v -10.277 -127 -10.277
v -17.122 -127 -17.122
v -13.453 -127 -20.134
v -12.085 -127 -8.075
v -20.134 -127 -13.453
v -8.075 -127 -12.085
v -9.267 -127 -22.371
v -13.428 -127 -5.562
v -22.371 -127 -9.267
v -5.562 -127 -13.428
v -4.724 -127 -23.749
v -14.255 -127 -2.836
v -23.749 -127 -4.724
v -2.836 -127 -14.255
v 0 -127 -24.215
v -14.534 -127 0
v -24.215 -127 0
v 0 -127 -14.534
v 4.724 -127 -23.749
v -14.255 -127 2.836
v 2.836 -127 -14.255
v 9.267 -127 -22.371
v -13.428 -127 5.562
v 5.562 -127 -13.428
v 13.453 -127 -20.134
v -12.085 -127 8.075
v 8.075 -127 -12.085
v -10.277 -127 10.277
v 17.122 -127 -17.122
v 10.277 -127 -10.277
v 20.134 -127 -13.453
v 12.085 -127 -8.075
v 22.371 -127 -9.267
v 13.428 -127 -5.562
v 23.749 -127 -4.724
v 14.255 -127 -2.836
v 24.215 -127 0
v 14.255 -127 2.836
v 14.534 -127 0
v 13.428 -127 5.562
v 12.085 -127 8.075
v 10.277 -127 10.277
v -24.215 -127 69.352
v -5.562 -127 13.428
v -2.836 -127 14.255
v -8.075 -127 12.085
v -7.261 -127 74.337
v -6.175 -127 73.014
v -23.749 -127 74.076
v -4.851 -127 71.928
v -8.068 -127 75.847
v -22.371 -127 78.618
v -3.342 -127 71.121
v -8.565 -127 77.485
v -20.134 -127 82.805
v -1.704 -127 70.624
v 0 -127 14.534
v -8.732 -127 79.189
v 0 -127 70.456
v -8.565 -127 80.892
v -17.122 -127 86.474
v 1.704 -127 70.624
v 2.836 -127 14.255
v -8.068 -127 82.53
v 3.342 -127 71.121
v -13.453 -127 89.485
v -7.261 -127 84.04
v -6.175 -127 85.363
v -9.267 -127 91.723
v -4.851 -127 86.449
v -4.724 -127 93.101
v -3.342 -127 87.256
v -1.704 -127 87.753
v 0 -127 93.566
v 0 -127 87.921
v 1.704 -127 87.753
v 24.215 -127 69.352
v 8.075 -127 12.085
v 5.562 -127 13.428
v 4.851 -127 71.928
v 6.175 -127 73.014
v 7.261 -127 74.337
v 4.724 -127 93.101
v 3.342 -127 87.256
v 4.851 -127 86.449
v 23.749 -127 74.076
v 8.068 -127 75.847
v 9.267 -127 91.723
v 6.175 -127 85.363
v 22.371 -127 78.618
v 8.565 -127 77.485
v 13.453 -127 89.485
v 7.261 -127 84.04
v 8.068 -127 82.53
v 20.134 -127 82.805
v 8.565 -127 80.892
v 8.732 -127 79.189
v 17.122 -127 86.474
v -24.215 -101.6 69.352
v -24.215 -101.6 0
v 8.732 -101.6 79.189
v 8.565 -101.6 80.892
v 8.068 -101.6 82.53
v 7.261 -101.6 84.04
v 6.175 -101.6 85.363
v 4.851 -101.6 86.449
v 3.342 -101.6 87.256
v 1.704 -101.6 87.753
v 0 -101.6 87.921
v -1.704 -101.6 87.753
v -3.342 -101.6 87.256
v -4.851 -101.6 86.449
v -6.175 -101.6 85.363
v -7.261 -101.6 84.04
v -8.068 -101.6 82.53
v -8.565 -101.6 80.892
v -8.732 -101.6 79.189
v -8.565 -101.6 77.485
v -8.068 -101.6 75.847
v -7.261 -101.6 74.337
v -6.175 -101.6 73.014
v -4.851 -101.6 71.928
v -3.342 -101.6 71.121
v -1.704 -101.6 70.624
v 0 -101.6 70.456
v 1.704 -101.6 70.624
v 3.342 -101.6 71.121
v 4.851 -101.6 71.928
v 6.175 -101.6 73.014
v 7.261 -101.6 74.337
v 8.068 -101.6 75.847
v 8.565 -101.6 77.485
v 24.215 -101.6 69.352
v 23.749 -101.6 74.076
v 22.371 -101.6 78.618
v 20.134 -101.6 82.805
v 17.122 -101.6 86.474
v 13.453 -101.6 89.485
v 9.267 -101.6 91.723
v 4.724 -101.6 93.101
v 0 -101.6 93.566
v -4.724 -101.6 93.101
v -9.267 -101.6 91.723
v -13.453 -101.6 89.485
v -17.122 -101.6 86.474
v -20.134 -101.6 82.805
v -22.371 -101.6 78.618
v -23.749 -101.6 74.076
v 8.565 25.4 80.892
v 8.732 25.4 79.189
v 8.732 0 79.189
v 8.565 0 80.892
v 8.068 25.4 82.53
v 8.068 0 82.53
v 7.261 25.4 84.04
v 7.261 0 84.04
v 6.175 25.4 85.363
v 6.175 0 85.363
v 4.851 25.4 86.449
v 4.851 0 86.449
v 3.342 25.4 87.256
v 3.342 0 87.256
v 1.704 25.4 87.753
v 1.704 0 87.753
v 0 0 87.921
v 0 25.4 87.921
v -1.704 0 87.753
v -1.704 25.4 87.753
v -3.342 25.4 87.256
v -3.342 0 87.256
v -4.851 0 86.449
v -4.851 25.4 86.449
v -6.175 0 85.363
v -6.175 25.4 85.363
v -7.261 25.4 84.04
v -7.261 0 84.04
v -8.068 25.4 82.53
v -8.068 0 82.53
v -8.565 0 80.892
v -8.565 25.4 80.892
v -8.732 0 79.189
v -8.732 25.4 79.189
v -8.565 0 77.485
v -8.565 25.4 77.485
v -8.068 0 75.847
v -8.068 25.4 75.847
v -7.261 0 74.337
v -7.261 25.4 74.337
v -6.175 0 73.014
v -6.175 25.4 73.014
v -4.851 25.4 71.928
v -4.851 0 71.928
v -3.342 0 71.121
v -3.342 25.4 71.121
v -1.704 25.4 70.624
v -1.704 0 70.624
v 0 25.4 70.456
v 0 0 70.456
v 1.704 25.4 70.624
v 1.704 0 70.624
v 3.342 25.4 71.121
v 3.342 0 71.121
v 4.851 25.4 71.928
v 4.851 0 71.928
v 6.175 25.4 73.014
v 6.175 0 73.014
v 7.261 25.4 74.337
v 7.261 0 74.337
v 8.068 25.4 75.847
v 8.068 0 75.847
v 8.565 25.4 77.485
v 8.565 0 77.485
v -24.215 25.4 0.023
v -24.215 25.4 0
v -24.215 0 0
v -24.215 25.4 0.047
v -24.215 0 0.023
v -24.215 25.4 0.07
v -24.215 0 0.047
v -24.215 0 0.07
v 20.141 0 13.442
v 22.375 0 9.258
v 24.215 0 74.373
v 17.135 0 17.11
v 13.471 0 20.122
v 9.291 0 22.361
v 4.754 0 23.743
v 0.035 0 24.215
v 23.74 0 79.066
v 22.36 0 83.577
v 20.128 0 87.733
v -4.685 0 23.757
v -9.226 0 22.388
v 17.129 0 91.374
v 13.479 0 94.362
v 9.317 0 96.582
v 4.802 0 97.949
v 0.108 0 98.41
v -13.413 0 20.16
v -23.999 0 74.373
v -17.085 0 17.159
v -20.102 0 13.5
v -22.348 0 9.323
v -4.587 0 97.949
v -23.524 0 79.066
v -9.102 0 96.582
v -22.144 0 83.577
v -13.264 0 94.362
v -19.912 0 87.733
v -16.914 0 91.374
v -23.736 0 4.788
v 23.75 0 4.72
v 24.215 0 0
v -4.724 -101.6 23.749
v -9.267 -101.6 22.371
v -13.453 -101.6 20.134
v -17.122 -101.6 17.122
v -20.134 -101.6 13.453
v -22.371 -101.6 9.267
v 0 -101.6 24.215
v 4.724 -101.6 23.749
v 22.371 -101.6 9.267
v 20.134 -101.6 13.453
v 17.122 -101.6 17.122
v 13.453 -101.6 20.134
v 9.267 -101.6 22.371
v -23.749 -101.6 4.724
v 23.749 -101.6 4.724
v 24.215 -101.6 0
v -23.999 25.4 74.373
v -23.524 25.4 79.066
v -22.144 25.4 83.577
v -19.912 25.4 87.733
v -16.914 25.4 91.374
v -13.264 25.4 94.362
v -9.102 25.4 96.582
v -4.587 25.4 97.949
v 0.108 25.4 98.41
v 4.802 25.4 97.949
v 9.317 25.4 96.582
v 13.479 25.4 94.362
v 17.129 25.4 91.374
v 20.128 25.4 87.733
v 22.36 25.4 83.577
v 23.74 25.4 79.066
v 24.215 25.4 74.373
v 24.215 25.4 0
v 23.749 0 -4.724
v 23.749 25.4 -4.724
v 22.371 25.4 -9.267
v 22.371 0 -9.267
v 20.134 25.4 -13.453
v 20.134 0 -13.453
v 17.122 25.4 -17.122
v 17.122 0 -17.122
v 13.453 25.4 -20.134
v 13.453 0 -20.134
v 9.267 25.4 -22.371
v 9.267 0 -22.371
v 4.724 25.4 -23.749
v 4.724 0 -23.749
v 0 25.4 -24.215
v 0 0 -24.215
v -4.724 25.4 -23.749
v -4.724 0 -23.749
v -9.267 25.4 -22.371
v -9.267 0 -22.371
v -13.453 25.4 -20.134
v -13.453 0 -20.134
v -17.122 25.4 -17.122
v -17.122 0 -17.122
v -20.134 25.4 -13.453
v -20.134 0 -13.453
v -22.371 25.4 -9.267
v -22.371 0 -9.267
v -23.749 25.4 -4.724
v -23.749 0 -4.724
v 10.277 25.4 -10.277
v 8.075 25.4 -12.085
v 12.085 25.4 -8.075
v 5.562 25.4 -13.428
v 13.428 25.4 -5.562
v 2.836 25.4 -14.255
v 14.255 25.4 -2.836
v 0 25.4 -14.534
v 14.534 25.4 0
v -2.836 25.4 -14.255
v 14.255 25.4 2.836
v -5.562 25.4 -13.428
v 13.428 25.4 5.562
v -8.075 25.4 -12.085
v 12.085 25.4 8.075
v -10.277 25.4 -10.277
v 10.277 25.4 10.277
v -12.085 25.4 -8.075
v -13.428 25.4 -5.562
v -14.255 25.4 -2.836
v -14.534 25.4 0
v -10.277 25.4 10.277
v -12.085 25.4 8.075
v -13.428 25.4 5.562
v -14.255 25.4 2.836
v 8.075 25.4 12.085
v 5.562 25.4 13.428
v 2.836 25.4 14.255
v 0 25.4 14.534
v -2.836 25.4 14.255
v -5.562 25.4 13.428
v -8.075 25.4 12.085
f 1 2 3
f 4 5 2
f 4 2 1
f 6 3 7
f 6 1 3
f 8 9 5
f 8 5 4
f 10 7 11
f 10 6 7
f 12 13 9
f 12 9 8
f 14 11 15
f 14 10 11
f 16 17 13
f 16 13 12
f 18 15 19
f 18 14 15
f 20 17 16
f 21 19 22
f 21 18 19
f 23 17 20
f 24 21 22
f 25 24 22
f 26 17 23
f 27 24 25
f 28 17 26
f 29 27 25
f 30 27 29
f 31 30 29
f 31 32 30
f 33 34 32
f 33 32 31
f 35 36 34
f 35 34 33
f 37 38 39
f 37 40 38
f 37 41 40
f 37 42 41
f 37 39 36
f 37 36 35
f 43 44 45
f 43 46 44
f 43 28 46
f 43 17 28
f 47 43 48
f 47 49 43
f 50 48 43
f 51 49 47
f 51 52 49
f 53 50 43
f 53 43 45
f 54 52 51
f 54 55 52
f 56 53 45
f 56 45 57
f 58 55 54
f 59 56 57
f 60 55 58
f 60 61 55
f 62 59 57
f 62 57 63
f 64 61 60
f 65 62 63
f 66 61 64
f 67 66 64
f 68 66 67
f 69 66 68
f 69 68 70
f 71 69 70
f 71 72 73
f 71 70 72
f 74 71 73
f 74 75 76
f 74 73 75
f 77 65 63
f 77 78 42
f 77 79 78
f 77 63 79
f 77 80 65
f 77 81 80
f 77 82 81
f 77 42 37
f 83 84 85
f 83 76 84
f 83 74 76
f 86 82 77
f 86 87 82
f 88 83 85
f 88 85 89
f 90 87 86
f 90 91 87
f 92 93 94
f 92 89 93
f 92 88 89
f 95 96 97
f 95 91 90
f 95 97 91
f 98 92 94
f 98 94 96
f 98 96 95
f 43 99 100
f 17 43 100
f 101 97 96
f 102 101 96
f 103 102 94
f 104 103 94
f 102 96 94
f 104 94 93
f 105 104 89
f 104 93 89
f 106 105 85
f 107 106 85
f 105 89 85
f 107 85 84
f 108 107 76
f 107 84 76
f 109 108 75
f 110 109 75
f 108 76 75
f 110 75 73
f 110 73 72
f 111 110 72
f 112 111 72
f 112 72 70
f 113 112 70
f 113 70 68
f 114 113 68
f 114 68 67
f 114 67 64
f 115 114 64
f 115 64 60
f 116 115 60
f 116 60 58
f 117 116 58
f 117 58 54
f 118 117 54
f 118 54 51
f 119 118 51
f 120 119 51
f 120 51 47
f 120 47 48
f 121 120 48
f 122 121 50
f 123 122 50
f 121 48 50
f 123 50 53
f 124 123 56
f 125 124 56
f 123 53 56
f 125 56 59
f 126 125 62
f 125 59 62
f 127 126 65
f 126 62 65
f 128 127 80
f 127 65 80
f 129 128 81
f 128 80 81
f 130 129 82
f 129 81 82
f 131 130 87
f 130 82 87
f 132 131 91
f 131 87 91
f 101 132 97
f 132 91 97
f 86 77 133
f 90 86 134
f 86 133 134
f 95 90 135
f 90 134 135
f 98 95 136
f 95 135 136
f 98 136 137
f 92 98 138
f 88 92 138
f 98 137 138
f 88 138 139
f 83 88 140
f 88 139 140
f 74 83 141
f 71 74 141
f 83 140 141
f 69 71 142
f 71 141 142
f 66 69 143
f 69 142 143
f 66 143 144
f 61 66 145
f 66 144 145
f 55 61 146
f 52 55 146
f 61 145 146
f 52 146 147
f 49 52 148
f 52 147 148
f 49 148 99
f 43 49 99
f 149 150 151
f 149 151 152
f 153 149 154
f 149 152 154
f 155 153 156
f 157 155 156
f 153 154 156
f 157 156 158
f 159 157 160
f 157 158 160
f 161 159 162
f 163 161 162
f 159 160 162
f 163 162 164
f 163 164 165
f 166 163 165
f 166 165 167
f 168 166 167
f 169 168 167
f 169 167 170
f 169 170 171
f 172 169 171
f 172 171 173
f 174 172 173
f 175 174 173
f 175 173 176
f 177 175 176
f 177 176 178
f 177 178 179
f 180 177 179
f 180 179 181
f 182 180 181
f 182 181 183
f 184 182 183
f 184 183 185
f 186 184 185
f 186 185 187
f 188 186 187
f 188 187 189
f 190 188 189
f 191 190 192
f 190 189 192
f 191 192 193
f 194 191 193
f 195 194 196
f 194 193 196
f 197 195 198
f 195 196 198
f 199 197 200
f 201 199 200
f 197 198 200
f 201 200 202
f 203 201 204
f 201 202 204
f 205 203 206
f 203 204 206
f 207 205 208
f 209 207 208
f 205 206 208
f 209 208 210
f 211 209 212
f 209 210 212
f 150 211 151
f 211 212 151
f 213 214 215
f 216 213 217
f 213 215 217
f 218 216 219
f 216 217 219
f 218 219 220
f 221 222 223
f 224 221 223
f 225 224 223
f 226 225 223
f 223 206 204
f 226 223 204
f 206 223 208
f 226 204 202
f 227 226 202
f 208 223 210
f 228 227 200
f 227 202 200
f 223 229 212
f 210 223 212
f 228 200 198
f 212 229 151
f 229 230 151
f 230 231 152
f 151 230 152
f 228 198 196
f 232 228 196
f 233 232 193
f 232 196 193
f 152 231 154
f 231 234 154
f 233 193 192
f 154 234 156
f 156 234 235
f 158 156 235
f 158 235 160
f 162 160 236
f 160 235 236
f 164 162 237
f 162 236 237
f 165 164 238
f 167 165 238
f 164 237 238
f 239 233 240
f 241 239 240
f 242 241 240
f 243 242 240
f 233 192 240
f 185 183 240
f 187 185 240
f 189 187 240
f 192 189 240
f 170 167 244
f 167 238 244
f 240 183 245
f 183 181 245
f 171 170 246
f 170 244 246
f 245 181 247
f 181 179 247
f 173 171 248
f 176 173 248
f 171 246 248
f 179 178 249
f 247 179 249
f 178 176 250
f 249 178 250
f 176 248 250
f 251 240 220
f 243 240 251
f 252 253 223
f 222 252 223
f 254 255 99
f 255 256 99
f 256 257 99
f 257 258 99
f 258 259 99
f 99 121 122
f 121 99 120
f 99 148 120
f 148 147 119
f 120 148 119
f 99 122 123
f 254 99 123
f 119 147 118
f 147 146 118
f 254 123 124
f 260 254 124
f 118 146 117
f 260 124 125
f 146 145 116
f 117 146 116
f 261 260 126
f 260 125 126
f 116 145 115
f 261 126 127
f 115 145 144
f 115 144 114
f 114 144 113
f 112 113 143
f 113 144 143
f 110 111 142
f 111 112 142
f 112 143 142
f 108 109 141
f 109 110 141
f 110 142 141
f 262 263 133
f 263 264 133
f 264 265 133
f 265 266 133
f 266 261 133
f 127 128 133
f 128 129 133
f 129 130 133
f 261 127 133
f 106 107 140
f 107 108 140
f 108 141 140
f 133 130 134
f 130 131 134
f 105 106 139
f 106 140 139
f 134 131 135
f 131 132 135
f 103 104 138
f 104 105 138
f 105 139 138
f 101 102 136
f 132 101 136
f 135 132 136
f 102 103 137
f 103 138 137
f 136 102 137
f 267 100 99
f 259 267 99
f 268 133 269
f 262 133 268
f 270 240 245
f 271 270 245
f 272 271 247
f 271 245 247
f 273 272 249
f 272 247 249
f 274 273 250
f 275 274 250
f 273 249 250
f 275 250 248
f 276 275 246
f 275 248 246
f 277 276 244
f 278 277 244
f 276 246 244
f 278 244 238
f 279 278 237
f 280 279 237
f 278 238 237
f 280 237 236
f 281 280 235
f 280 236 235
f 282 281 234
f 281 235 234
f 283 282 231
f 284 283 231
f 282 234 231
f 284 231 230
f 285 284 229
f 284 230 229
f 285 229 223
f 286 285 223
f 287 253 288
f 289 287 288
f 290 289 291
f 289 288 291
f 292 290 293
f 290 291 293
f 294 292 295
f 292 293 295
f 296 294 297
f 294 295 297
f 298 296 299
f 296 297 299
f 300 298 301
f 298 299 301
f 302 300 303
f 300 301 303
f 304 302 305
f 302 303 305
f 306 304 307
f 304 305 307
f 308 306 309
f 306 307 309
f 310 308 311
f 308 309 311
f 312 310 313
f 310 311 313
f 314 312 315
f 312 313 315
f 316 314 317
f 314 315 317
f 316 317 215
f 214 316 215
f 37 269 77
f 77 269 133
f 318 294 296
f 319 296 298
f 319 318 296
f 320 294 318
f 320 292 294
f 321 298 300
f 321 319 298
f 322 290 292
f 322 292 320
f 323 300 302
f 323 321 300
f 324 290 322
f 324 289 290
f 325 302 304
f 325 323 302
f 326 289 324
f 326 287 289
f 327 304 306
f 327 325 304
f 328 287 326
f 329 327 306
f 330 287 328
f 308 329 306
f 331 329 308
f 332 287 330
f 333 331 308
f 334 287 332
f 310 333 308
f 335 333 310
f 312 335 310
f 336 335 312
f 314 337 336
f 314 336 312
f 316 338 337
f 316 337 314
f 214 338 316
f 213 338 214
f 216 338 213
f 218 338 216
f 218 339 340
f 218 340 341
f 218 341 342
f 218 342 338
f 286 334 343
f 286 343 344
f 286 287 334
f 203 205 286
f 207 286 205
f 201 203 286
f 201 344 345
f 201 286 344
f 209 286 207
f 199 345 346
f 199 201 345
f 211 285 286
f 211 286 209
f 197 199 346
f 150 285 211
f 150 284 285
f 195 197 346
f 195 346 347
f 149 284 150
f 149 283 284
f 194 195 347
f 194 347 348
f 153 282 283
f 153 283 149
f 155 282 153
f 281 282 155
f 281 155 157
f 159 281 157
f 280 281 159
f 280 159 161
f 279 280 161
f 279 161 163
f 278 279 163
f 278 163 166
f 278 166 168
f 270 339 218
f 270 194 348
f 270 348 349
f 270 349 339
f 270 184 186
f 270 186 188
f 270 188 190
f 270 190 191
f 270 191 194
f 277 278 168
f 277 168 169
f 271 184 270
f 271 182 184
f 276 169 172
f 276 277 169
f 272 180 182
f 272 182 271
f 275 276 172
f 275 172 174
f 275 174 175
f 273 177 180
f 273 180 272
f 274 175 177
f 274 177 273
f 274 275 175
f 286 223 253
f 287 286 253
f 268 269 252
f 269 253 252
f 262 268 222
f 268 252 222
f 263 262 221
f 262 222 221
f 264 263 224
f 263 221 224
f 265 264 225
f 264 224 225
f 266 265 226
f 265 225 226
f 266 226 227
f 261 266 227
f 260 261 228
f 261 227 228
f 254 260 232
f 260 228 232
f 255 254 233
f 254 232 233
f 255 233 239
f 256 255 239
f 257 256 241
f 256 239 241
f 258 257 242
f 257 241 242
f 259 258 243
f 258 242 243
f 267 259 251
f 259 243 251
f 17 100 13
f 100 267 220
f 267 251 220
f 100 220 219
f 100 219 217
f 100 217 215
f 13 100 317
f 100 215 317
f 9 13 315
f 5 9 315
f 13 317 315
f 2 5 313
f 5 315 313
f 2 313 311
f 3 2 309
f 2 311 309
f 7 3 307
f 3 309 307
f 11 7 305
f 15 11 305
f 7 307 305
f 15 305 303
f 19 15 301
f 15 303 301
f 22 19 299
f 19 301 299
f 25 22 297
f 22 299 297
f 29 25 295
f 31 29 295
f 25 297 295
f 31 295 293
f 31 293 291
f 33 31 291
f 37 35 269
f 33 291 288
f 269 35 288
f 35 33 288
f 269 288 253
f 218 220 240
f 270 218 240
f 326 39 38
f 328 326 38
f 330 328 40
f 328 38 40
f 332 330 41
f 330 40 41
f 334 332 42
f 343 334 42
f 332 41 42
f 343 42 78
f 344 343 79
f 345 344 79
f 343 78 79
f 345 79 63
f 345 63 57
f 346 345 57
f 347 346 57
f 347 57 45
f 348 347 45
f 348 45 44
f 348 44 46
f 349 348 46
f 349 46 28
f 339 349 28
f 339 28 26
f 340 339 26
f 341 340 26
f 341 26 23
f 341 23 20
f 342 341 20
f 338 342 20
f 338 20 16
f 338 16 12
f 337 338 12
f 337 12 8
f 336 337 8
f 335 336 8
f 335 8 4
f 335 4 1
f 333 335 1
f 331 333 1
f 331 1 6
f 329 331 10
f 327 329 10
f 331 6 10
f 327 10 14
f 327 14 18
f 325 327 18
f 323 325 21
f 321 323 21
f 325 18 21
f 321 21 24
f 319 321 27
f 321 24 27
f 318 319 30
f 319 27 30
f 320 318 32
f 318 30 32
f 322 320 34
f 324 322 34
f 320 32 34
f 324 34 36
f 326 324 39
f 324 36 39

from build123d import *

# Parameters (mm, degrees)
F0_R     = 24.2146085631
F1_DEPTH = 101.6
F3_DEPTH = 25.4
F5_DEPTH = 25.4
F6_R     = 8.7323577449
F6_R_2   = 14.5344701606
F7_DEPTH = 254


with BuildPart() as f1:
    # F0 (on Front) → F1 (new body)
    with BuildSketch(Plane.XZ):
        Circle(F0_R)
    extrude(amount=F1_DEPTH)

    # F2 (on face) → F3 (join)
    with BuildSketch(Plane.XZ.offset(101.6)):
        with BuildLine():
            Line((-24.2146085631, 69.3517327309), (-24.2146085631, 0))
            ThreePointArc((-24.2146085631, 0), (0, 24.2146085631), (24.2146085631, 0))
            Line((24.2146085631, 0), (24.2146085631, 69.3517327309))
            ThreePointArc((24.2146085631, 69.3517327309), (0, 93.5663412939), (-24.2146085631, 69.3517327309))
        make_face()
        with BuildLine():
            ThreePointArc((24.2146085631, 0), (0, 24.2146085631), (-24.2146085631, 0))
            ThreePointArc((-24.2146085631, 0), (0, -24.2146085631), (24.2146085631, 0))
        make_face()
    extrude(amount=F3_DEPTH)

    # F4 (on face) → F5 (join)
    with BuildSketch(Plane(origin=(0, 0, 0), x_dir=(-1, 0, 0), z_dir=(0, 1, 0))):
        with BuildLine():
            ThreePointArc((23.9994246513, 74.3728801608), (-0.1075919559, 98.4102157735), (-24.2146085631, 74.3728801608))
            Line((-24.2146085631, 74.3728801608), (23.9994246513, 74.3728801608))
        make_face()
        with BuildLine():
            Line((-24.2146085631, 74.3728801608), (-24.2146085631, 0))
            ThreePointArc((-24.2146085631, 0), (-0.0350465649, 24.2145832011), (24.2145071151, 0.0700930563))
            Line((24.2145071151, 0.0700930563), (23.9994246513, 74.3728801608))
            Line((23.9994246513, 74.3728801608), (-24.2146085631, 74.3728801608))
        make_face()
        with BuildLine():
            ThreePointArc((24.2145071151, 0.0700930563), (-0.0350465649, 24.2145832011), (-24.2146085631, 0))
            ThreePointArc((-24.2146085631, 0), (0, -24.2146085631), (24.2146085631, 0))
            ThreePointArc((24.2146085631, 0), (24.2145832011, 0.0350465649), (24.2145071151, 0.0700930563))
        make_face()
    extrude(amount=F5_DEPTH)

    # F6 (on face) → F7 (cut)
    with BuildSketch(Plane.XZ.offset(127)):
        with Locations((0, 79.1887566447)):
            Circle(F6_R)
        Circle(F6_R_2)
    extrude(amount=-F7_DEPTH, mode=Mode.SUBTRACT)


solid = f1.part
